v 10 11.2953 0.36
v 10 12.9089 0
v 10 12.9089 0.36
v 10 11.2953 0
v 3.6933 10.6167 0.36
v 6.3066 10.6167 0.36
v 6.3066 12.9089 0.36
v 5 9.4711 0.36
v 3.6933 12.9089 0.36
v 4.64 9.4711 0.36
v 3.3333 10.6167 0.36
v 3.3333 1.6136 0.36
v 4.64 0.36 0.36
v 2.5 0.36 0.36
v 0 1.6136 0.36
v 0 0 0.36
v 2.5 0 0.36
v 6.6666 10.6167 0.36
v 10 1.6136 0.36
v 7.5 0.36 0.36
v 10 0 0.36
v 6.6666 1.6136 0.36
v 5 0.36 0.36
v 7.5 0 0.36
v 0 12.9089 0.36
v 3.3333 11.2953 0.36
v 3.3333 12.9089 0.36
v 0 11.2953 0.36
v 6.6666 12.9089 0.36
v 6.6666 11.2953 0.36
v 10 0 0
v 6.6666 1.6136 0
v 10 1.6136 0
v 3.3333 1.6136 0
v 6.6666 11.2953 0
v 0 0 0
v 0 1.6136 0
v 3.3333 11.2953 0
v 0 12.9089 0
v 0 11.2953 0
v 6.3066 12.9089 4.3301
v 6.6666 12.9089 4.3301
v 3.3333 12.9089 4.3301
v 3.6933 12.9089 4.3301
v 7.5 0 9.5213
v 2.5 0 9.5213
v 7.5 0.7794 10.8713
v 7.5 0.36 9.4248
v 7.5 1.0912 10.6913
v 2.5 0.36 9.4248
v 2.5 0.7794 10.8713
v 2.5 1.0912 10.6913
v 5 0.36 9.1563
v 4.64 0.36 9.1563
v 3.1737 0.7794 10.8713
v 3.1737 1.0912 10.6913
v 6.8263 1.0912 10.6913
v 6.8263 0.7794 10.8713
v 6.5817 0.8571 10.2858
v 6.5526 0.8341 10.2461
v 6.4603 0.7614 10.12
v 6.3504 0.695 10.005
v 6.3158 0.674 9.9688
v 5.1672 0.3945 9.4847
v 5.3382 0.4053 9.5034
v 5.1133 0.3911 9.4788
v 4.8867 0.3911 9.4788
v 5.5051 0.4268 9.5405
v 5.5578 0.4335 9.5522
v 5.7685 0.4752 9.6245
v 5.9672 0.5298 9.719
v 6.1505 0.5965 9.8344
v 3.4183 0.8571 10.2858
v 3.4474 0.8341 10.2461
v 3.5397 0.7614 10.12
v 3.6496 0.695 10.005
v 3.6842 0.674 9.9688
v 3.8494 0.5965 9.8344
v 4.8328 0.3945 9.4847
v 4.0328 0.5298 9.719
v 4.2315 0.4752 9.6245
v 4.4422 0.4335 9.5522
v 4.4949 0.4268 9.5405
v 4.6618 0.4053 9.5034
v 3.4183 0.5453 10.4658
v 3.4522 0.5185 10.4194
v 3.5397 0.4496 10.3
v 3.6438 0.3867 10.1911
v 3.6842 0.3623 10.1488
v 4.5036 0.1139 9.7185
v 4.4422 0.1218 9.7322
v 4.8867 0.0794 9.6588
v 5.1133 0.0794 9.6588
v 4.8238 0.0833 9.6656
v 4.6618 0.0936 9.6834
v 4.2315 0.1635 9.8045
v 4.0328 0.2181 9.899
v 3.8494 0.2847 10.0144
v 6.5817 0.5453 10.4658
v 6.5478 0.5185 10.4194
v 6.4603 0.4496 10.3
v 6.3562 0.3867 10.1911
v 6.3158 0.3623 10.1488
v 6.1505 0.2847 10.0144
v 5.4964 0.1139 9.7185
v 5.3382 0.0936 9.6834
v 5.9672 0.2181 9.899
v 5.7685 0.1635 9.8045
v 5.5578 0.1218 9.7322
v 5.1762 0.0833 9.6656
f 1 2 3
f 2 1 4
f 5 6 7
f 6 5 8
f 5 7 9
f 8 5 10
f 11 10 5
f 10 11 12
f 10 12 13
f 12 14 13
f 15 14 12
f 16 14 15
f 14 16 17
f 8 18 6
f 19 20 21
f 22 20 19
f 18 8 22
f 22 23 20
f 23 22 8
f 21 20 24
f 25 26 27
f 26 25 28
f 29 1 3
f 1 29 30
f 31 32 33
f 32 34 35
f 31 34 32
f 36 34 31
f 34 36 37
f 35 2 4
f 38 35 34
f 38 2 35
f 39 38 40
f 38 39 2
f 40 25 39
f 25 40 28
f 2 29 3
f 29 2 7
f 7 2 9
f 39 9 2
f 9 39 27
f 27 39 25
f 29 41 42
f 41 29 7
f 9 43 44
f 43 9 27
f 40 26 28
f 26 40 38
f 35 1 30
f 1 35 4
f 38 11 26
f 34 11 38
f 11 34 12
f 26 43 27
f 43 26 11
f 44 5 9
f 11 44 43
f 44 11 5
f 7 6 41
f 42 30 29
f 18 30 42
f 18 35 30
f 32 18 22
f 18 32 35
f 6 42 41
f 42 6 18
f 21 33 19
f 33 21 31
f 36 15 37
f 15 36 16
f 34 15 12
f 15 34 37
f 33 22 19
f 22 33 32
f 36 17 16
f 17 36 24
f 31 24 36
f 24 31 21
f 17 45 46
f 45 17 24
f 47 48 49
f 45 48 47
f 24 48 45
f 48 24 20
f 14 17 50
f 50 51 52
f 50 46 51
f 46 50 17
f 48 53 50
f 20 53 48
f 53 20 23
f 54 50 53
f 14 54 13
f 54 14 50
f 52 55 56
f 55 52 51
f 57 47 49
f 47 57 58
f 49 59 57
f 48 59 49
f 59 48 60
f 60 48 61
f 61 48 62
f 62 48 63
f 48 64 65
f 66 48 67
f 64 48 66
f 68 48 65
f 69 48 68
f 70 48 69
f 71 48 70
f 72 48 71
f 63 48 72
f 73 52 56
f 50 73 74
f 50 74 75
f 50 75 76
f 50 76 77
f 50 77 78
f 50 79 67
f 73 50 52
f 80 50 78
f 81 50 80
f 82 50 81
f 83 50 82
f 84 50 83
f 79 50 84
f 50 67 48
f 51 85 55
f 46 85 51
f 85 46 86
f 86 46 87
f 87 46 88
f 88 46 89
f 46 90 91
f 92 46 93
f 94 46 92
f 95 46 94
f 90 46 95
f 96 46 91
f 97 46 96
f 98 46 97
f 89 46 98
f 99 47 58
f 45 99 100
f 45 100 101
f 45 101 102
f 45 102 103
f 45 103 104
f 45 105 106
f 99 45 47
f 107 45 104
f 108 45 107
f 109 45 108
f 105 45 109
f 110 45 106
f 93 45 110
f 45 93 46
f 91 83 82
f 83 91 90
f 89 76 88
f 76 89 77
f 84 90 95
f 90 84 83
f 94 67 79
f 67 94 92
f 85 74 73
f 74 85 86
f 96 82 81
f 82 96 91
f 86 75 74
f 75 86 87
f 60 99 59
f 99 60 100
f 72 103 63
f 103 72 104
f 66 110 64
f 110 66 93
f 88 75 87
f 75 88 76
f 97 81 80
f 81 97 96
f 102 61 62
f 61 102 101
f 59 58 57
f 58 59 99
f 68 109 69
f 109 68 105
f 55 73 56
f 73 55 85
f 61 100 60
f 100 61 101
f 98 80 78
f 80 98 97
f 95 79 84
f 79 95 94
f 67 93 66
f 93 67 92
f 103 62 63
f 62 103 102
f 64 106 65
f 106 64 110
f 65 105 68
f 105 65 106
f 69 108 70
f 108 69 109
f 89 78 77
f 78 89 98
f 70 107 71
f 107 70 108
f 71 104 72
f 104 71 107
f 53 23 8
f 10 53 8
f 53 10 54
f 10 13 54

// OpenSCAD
$fn = 50;

union() {
    translate([3.3333, 0, 0]) {
        cube([3.3333, 12.9089, 0.36]);
    };
    union() {
        translate([0, 11.2953, 0]) {
            cube([10, 1.6136, 0.36]);
        };
        translate([3.3333, 12.9089, 0]) {
            rotate([180, 270, 0]) {
                linear_extrude(height=0.36) {
                    polygon([[0, 0], [4.3301270189222, 0], [0, 2.5]]);
                };
            };
        };
        translate([6.3066, 12.9089, 0]) {
            rotate([180, 270, 0]) {
                linear_extrude(height=0.36) {
                    polygon([[0, 0], [4.3301270189222, 0], [0, 2.5]]);
                };
            };
        };
    };
    difference() {
        union() {
            cube([10, 1.6136, 0.36]);
            translate([2.5, 0, 0]) {
                cube([5, 0.36, 9.5213]);
            };
            translate([2.5, 0, 9.5213]) {
                rotate([-30, 0, 0]) {
                    cube([5, 0.36, 1.5588]);
                };
            };
        };
        hull() {
            translate([5, 3.1603142074251, 9.9601]) {
                rotate([60, 0, 0]) {
                    cylinder(h=9, r2=1.805, r1=1.805);
                };
            };
            translate([5, 3.1603142074251, 11.7601]) {
                rotate([60, 0, 0]) {
                    cylinder(h=9, r2=2.527, r1=2.527);
                };
            };
        };
    };
    translate([5, 0.36, 0.36]) {
        rotate([0, 270, 0]) {
            linear_extrude(height=0.36) {
                polygon([[0, 0], [8.7963, 0], [0, 9.1110630156113]]);
            };
        };
    };
};
